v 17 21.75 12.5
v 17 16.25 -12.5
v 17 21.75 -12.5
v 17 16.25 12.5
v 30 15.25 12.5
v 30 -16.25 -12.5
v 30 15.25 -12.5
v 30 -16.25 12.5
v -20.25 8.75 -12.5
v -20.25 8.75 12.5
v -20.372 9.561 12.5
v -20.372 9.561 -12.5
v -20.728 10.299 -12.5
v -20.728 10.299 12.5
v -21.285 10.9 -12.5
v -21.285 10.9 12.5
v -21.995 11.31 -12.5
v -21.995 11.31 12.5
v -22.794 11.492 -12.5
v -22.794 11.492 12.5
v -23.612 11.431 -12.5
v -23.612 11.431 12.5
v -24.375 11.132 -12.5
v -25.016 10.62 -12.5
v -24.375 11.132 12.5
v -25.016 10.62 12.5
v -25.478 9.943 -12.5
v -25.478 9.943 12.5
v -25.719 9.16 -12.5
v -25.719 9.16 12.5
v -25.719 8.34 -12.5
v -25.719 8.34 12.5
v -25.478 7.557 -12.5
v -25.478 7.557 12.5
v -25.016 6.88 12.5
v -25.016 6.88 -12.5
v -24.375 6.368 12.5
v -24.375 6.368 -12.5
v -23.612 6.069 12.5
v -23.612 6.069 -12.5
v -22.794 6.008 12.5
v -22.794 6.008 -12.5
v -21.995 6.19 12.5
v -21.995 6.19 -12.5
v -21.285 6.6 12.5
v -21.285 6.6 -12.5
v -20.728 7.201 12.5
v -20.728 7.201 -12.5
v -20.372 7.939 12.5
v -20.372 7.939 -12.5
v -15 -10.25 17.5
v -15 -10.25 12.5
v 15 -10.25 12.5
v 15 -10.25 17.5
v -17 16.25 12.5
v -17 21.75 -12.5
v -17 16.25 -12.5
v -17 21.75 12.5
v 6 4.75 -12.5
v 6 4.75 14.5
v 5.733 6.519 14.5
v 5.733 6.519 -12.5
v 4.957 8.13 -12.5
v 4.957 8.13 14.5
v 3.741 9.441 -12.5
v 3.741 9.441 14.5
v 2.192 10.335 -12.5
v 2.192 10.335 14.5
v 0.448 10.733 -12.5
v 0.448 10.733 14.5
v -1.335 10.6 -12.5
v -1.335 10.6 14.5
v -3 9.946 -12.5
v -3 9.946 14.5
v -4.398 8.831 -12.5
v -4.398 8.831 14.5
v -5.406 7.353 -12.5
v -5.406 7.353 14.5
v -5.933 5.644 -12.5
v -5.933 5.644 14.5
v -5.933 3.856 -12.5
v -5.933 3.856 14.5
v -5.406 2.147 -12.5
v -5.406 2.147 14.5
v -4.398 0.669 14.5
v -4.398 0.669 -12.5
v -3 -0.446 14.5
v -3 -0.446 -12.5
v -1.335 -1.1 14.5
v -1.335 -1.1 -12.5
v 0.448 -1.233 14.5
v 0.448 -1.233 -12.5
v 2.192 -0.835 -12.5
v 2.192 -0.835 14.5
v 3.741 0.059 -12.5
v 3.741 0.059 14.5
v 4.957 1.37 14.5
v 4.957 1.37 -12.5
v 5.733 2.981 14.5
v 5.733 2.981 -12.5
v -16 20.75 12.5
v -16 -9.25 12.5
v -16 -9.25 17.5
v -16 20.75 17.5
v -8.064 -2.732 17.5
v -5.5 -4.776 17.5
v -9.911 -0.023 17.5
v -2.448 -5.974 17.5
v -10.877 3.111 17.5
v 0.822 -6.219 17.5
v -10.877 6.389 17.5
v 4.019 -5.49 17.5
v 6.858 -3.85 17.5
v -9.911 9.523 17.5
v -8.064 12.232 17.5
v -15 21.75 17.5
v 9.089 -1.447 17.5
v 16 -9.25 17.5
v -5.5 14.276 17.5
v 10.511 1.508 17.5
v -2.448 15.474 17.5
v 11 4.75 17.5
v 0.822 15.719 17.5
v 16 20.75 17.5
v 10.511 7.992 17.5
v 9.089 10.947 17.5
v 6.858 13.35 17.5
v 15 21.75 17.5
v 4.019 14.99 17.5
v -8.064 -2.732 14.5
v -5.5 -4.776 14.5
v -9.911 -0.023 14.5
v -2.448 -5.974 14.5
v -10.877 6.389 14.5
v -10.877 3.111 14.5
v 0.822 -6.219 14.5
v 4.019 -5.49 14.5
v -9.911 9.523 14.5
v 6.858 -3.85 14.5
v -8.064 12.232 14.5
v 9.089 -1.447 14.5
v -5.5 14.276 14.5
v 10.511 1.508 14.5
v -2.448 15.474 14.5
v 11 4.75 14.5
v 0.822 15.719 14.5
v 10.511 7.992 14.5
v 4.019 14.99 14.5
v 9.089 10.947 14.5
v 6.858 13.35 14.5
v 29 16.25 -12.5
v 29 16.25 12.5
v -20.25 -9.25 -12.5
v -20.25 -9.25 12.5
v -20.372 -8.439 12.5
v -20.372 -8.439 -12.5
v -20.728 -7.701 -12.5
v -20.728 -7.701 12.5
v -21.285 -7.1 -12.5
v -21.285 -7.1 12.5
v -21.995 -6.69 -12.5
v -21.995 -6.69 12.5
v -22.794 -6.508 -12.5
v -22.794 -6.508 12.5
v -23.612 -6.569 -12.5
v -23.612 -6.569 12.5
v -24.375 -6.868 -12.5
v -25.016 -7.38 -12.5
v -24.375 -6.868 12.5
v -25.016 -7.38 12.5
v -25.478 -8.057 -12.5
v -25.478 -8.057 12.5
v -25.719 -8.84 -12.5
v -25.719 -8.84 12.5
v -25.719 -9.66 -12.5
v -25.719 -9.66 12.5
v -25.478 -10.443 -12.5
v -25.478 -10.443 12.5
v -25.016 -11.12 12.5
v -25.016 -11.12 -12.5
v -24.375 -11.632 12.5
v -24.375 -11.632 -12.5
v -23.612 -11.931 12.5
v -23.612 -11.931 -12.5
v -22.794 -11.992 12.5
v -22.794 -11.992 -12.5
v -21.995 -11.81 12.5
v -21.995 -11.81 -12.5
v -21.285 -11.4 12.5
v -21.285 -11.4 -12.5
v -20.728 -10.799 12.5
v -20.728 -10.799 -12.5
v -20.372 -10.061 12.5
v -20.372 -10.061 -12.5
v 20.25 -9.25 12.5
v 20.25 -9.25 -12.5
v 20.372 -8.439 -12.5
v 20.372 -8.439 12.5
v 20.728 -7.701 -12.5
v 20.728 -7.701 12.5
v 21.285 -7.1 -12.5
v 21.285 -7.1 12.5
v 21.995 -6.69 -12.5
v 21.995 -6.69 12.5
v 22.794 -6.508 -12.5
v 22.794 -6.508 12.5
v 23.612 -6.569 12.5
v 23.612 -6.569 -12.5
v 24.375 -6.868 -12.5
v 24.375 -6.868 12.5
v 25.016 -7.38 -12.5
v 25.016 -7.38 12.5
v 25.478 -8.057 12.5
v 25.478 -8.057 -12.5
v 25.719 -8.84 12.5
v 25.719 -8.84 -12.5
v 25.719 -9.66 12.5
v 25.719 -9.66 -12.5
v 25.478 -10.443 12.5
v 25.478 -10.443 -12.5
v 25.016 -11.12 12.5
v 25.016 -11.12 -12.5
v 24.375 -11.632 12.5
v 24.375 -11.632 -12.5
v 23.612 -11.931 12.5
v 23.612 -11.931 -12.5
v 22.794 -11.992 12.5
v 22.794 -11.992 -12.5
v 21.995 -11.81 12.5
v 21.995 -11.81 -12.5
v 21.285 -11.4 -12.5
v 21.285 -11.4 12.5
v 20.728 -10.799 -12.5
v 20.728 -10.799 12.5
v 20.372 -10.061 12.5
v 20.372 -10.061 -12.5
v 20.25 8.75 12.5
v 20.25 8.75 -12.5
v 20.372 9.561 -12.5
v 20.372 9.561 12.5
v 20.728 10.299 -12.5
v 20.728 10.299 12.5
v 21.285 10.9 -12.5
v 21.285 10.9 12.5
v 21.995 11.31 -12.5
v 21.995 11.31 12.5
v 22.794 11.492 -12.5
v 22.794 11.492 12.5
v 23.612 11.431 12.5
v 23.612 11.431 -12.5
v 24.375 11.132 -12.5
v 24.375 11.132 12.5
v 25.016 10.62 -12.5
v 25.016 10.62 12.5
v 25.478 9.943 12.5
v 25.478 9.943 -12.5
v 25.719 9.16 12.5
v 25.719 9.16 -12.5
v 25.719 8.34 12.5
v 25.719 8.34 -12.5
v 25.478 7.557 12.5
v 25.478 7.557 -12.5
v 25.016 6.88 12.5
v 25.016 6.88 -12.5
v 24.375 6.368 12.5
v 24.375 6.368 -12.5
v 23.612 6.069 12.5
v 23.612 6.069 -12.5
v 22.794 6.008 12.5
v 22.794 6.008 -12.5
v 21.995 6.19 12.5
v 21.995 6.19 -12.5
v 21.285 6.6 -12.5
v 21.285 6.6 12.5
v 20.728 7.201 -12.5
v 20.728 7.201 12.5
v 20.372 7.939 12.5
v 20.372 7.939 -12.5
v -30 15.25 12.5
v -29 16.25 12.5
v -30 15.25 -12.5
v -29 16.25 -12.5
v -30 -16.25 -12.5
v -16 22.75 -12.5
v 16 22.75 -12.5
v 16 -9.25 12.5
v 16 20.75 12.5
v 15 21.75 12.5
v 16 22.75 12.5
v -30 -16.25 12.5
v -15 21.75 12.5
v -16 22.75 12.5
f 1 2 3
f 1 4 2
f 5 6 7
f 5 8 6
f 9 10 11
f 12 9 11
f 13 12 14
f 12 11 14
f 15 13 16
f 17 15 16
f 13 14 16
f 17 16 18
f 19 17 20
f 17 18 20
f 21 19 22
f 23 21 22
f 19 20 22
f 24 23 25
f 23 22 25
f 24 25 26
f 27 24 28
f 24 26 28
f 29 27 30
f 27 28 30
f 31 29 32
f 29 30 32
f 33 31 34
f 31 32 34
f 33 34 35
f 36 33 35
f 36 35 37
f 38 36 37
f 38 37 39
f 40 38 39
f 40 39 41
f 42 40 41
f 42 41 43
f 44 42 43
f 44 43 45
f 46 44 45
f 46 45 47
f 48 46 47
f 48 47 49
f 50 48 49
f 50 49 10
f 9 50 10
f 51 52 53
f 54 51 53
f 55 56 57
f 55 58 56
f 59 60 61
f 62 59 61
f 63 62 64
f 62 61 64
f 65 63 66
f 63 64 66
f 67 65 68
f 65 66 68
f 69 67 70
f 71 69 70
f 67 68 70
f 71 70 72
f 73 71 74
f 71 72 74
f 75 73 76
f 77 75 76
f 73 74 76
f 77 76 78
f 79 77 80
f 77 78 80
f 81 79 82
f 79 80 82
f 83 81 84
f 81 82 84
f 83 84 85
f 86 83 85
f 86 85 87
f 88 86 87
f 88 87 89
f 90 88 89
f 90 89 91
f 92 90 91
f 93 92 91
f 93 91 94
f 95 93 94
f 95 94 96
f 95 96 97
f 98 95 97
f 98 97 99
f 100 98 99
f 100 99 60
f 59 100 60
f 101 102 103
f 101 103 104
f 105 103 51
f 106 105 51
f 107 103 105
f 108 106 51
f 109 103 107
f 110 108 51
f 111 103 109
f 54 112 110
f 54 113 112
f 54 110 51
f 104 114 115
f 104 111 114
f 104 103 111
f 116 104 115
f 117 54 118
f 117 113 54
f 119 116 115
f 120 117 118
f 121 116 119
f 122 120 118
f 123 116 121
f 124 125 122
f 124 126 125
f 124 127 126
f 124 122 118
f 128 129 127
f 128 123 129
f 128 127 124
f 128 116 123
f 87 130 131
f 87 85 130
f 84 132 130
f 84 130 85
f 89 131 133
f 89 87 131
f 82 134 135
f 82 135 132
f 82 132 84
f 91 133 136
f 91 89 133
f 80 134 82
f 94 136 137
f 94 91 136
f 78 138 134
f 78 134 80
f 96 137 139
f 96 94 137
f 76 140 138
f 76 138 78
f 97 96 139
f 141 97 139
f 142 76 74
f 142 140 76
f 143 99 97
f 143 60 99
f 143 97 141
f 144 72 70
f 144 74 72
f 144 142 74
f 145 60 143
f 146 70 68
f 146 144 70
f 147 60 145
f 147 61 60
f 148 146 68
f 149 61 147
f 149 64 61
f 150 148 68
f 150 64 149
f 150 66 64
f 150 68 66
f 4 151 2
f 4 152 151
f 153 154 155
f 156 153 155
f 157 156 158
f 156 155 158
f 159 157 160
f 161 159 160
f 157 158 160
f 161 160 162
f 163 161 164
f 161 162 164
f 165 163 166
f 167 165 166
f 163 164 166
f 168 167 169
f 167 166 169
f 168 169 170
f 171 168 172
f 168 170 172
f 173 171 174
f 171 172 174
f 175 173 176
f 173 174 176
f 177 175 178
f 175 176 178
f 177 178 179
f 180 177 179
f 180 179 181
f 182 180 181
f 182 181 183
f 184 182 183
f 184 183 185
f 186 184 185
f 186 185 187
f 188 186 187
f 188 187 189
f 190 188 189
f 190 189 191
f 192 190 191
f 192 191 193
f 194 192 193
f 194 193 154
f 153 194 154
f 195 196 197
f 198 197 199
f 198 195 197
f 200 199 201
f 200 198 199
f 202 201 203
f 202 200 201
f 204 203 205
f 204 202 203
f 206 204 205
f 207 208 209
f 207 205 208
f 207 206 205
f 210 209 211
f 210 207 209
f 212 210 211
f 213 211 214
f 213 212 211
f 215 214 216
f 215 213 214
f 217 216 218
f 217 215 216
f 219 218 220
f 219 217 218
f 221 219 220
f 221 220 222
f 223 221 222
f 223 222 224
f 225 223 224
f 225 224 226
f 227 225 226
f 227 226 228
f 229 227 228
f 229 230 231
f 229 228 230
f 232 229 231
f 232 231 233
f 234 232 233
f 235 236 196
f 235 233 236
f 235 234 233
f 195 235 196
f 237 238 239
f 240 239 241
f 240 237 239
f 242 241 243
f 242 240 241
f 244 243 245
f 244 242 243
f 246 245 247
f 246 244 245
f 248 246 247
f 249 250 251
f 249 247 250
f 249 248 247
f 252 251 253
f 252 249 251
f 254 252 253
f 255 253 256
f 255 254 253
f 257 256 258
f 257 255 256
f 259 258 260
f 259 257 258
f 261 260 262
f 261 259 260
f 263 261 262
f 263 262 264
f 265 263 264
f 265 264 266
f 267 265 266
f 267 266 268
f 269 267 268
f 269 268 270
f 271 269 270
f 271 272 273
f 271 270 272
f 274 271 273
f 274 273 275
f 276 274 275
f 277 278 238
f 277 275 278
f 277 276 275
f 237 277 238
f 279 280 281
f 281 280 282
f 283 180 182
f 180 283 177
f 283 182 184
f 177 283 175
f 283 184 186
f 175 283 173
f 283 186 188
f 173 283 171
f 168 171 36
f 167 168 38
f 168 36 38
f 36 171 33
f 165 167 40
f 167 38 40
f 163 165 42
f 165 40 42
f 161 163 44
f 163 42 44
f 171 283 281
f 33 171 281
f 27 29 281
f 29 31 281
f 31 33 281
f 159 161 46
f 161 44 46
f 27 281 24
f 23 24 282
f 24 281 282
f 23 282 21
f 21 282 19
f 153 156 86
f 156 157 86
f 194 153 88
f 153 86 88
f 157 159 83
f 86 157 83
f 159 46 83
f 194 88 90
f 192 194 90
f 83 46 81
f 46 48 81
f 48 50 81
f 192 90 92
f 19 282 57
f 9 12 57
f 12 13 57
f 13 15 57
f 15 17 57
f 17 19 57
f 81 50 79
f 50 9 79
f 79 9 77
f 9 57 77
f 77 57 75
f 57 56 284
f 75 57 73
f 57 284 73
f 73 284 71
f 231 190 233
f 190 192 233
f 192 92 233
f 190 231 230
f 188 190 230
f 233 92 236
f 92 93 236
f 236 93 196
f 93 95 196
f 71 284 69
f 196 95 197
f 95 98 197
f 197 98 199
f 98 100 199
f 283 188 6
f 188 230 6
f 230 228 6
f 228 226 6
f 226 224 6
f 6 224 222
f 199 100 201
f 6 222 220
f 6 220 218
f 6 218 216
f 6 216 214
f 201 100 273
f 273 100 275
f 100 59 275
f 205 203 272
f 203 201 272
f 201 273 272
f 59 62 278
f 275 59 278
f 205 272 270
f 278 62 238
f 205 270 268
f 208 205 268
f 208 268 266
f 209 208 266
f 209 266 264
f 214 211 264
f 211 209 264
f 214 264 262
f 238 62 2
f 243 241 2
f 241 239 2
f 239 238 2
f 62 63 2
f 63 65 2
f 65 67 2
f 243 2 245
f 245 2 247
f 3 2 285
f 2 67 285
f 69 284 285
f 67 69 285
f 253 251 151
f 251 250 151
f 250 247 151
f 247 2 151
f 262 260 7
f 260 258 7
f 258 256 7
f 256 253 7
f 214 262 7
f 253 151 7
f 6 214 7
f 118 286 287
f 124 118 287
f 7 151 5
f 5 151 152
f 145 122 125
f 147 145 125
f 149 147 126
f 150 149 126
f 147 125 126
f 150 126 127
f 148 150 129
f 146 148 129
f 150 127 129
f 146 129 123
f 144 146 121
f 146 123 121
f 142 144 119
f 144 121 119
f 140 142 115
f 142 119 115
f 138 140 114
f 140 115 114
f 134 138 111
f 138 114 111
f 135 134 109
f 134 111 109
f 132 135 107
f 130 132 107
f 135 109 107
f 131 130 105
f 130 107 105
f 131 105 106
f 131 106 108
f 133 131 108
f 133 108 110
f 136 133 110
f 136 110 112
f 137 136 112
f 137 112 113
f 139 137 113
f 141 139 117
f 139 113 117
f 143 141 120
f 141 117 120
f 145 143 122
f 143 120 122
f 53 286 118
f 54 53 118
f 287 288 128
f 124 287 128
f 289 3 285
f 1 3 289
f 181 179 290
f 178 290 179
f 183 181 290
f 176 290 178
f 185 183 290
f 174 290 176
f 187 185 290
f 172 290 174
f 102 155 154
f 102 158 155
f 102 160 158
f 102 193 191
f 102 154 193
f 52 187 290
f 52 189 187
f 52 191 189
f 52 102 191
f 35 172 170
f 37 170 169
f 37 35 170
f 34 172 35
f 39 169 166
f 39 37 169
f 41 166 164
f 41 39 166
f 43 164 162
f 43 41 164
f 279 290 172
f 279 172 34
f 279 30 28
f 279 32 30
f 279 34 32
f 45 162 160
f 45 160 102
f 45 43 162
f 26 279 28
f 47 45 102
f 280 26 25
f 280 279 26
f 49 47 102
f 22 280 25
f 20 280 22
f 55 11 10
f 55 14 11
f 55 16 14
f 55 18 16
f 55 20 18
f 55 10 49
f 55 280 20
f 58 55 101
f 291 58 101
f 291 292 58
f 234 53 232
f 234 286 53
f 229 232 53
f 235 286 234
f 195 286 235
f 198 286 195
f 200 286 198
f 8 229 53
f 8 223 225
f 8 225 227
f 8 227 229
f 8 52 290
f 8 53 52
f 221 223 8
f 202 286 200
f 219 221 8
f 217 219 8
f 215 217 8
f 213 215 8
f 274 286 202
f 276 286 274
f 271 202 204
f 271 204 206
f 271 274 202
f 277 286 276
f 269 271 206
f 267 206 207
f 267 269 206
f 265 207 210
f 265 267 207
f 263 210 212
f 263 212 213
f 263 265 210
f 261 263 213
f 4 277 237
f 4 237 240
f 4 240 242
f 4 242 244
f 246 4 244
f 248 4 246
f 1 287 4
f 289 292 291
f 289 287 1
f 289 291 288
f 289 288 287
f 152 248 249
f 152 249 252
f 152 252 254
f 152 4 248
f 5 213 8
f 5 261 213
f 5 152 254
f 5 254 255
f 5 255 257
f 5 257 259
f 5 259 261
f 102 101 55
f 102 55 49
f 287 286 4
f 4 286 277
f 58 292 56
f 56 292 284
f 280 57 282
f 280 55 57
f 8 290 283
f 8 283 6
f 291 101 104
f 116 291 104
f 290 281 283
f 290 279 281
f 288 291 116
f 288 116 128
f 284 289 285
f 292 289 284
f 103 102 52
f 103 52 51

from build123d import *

# Parameters (mm, degrees)
EXTRUDE_1_DEPTH     = 12.5
SKETCH_2_W          = 32
SKETCH_2_H          = 32
EXTRUDE_2_DEPTH     = 5
CHAMFER_1_SIZE      = 1
CHAMFER_2_SIZE      = 1
SKETCH_3_R          = 2.75
CUT_EXTRUDE_1_DEPTH = 46.194717612
CHAMFER_3_SIZE      = 1
SKETCH_4_R          = 6
CUT_EXTRUDE_2_DEPTH = 49.141068746
SKETCH_5_R          = 11
CUT_EXTRUDE_3_DEPTH = 3


with BuildPart() as part:
    # Sketch 1 → Extrude 1 (new, symmetric)
    with BuildSketch(Plane.XY):
        Polygon((-30, 16.25), (-30, -16.25), (30, -16.25), (30, 16.25), (17, 16.25), (17, 22.75), (-17, 22.75), (-17, 16.25), align=None)
    extrude(amount=EXTRUDE_1_DEPTH, both=True)

    # Sketch 2 → Extrude 2 (add)
    with BuildSketch(Plane.XY.offset(12.5)):
        with Locations((0, 5.75)):
            Rectangle(SKETCH_2_W, SKETCH_2_H)
    extrude(amount=EXTRUDE_2_DEPTH)

    # Chamfer 1
    chamfer_1_edges = [part.edges().sort_by_distance(p)[0] for p in [
        (-16, 21.75, 15),
        (-16, -10.25, 15),
        (16, -10.25, 15),
        (16, 21.75, 15),
    ]]
    chamfer(chamfer_1_edges, length=CHAMFER_1_SIZE)

    # Chamfer 2
    chamfer_2_edges = [part.edges().sort_by_distance(p)[0] for p in [
        (30, 16.25, 0),
        (-30, 16.25, 0),
    ]]
    chamfer(chamfer_2_edges, length=CHAMFER_2_SIZE)

    # Sketch 3 → Cut-Extrude 1 (cut, through all)
    with BuildSketch(Plane.XY.offset(12.5)):
        with Locations((-23, 8.75)):
            Circle(SKETCH_3_R)
        with Locations((-23, -9.25)):
            Circle(SKETCH_3_R)
    cut_extrude_1 = extrude(amount=-CUT_EXTRUDE_1_DEPTH, mode=Mode.SUBTRACT)

    # Mirror 1: Cut-Extrude 1 across plane
    add(cut_extrude_1.mirror(Plane(origin=(0, 0, 0), x_dir=(0, 0, 1), z_dir=(1, 0, 0))), mode=Mode.SUBTRACT)

    # Chamfer 3
    chamfer_3_edges = [part.edges().sort_by_distance(p)[0] for p in [
        (-17, 22.75, 0),
        (17, 22.75, 0),
    ]]
    chamfer(chamfer_3_edges, length=CHAMFER_3_SIZE)

    # Sketch 4 → Cut-Extrude 2 (cut, through all)
    with BuildSketch(Plane.XY.offset(17.5)):
        with Locations((0, 4.75)):
            Circle(SKETCH_4_R)
    extrude(amount=-CUT_EXTRUDE_2_DEPTH, mode=Mode.SUBTRACT)

    # Sketch 5 → Cut-Extrude 3 (cut)
    with BuildSketch(Plane.XY.offset(17.5)):
        with Locations((0, 4.75)):
            Circle(SKETCH_5_R)
    extrude(amount=-CUT_EXTRUDE_3_DEPTH, mode=Mode.SUBTRACT)


solid = part.part
